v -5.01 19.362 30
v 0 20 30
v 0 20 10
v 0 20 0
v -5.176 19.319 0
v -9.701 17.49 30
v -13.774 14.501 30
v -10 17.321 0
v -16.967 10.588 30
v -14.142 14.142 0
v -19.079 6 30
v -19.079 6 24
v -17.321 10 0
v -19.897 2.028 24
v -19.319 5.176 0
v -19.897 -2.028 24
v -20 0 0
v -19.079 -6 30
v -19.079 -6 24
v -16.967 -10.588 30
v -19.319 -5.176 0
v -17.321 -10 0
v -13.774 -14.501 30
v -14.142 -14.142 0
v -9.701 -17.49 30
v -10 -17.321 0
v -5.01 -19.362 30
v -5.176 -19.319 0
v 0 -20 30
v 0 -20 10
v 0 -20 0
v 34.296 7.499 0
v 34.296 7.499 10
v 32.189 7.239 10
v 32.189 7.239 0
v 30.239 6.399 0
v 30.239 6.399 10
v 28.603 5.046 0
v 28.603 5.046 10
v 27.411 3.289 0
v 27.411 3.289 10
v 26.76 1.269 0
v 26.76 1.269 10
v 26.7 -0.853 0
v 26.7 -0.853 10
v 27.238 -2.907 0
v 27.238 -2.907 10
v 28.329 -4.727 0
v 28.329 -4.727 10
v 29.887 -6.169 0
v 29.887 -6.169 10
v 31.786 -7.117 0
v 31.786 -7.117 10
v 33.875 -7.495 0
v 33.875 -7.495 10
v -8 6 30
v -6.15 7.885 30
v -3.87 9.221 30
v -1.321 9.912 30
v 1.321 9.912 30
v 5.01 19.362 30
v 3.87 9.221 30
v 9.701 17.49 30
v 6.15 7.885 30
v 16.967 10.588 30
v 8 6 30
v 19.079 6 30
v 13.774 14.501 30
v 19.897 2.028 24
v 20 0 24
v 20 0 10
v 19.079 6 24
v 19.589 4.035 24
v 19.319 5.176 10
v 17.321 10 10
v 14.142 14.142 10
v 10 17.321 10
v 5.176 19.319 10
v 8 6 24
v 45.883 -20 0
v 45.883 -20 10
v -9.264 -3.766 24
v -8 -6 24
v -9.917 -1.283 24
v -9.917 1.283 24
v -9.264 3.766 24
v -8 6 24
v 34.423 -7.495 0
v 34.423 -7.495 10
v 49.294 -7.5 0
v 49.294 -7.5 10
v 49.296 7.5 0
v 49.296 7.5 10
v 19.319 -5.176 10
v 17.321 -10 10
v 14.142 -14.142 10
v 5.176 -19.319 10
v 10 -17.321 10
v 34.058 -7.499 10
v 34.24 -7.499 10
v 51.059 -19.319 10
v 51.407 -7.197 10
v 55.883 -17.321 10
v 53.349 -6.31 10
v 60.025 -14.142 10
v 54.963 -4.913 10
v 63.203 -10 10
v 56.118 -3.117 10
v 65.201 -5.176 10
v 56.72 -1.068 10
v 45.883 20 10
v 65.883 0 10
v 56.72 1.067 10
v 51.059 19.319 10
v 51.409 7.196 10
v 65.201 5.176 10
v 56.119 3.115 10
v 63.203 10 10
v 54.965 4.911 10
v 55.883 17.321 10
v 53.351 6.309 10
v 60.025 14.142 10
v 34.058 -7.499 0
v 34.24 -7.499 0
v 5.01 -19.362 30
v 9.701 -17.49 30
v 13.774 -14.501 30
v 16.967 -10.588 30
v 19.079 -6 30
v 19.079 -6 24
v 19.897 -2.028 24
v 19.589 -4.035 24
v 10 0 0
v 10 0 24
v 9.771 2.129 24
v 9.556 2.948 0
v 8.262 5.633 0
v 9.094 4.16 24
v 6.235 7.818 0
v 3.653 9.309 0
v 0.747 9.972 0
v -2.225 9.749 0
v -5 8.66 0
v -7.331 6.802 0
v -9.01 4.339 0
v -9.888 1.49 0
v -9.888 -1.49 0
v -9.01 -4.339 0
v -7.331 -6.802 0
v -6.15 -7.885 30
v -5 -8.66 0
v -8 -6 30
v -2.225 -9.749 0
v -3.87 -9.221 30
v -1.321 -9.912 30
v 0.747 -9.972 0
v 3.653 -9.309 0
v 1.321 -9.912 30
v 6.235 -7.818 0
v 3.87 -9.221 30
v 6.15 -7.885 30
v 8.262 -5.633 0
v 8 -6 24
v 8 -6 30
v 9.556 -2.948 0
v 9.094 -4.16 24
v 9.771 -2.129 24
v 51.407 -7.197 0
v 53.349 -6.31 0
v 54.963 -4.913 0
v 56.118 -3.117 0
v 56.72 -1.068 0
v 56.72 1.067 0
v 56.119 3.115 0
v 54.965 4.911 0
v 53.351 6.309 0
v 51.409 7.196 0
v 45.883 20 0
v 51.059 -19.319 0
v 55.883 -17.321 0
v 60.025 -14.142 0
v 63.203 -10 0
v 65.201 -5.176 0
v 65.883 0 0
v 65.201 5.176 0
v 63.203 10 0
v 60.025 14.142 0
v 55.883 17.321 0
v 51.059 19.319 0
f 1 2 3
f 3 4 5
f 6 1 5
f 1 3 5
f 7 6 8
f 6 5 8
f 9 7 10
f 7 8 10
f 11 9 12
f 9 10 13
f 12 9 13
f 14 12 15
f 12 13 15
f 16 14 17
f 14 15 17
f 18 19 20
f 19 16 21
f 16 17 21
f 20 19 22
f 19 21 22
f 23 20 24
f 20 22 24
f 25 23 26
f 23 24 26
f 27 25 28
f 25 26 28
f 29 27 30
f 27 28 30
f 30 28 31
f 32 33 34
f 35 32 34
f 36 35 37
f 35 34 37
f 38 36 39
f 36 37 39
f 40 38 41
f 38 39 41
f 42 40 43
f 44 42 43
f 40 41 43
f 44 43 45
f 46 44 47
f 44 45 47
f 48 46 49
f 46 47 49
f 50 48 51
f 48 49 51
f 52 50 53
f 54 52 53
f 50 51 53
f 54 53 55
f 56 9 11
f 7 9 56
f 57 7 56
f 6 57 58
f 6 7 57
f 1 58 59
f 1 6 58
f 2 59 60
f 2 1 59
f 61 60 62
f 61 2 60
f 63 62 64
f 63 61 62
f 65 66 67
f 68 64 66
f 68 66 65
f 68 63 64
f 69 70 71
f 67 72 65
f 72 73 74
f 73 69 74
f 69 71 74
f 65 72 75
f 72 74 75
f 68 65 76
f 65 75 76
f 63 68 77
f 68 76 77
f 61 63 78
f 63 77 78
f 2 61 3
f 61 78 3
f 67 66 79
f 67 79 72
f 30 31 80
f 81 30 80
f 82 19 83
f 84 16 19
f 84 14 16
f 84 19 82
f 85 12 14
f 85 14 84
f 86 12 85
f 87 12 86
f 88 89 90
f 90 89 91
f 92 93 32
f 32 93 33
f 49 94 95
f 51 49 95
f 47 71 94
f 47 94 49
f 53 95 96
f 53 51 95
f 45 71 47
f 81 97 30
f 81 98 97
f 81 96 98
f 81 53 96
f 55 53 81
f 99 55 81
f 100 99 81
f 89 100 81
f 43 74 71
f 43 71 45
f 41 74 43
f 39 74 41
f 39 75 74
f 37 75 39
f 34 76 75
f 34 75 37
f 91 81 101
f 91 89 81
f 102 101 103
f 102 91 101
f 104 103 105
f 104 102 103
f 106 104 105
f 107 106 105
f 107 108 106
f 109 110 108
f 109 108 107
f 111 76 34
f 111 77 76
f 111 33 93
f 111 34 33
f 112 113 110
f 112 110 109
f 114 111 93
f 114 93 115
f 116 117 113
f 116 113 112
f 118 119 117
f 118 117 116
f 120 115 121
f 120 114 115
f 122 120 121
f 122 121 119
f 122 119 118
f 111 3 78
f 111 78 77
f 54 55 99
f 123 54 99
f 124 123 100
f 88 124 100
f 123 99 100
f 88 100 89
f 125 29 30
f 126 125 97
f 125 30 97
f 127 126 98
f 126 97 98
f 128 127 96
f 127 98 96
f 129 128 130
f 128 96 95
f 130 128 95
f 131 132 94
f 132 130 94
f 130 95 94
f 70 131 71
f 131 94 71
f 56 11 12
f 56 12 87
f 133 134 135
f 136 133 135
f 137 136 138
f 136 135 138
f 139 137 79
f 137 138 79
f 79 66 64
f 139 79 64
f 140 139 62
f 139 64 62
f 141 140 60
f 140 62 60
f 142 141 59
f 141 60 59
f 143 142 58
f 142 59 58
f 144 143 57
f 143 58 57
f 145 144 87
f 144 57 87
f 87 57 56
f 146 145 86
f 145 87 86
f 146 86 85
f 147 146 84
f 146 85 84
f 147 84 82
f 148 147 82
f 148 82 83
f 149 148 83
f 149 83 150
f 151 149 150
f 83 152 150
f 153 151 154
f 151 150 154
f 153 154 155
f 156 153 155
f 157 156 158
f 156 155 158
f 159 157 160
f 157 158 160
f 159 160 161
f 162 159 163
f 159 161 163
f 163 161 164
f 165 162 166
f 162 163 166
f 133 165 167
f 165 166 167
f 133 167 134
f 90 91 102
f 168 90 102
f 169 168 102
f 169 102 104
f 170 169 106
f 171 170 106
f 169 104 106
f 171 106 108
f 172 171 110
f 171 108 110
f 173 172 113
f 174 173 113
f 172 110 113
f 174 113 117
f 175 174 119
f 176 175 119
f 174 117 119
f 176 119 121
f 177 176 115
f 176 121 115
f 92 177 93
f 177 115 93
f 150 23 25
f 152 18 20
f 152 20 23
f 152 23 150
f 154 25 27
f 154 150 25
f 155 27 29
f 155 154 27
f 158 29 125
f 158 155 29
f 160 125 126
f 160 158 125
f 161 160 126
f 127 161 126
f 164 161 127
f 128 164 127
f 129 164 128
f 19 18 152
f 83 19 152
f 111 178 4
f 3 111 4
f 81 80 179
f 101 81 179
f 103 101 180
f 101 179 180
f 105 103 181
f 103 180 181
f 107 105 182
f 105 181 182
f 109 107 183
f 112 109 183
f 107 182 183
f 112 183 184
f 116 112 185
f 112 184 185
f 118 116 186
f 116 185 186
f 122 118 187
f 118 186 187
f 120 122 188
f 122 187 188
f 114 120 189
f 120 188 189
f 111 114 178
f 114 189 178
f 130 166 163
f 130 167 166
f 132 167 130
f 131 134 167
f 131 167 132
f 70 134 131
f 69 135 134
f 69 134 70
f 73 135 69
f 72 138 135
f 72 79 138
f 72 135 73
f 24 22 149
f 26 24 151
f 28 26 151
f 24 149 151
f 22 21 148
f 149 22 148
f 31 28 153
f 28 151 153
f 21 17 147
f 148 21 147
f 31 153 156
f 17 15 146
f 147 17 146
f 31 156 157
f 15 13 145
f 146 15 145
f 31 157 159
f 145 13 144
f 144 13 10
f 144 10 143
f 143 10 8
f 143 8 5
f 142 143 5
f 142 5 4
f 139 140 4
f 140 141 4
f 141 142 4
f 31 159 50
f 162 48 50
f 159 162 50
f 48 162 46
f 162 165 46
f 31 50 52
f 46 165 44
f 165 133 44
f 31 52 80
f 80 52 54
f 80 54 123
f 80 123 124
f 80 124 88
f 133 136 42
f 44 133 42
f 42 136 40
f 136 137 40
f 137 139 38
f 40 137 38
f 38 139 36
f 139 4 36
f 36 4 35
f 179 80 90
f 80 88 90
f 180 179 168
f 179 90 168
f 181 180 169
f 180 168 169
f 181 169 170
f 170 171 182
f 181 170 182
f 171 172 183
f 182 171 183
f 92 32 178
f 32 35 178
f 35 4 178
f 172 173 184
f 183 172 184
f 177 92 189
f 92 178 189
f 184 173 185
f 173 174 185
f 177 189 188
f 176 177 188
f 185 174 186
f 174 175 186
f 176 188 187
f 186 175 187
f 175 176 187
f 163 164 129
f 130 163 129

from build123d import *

# Parameters (mm, degrees)
F1_DEPTH  = 10
F3_DEPTH  = 20
F4_R      = 10
F5_DEPTH  = 93.7
F6_W      = 50
F6_H      = 12
F7_DEPTH  = 6
F10_DEPTH = 28.9


with BuildPart() as f1:
    # F0 (on Top) → F1 (new body)
    with BuildSketch(Plane.XY):
        with BuildLine():
            Line((45.882642, 20), (0, 20))
            ThreePointArc((0, 20), (-20, 0), (0, -20))
            Line((0, -20), (45.882642, -20))
            ThreePointArc((45.882642, -20), (65.882642, 0), (45.882642, 20))
        make_face()
    extrude(amount=F1_DEPTH)

    # F2 (on face) → F3 (join)
    with BuildSketch(Plane.XY.offset(10)):
        with BuildLine():
            ThreePointArc((0, -20), (14.142136, -14.142136), (20, 0))
            ThreePointArc((20, 0), (14.142136, 14.142136), (0, 20))
            ThreePointArc((0, 20), (-20, 0), (0, -20))
        make_face()
    extrude(amount=F3_DEPTH)

    # F4 (on face) → F5 (cut)
    with BuildSketch(Plane.XY.offset(30)):
        Circle(F4_R)
    extrude(amount=-F5_DEPTH, mode=Mode.SUBTRACT)

    # F6 (on face) → F7 (cut)
    with BuildSketch(Plane.XY.offset(30)):
        Rectangle(F6_W, F6_H)
    extrude(amount=-F7_DEPTH, mode=Mode.SUBTRACT)

    # F8 (on face) + F9 (on face) → F10 (cut)
    with BuildSketch(Plane.XY.offset(10)):
        with BuildLine():
            Line((49.295593, 7.5), (34.295593, 7.498614))
            ThreePointArc((34.295593, 7.498614), (26.654353, 0.210243), (33.875122, -7.494909))
            Line((33.875122, -7.494909), (34.422741, -7.49509))
            Line((34.422741, -7.49509), (49.29381, -7.5))
            ThreePointArc((49.29381, -7.5), (56.796286, -0.000891), (49.295593, 7.5))
        make_face()
        with BuildLine():
            Line((34.422741, -7.49509), (33.875122, -7.494909))
            ThreePointArc((33.875122, -7.494909), (34.14893, -7.5), (34.422741, -7.49509))
        make_face()
    with BuildSketch(Plane.XY.offset(10)):
        with BuildLine():
            ThreePointArc((49.29381, -7.5), (56.796286, -0.000891), (49.295593, 7.5))
            Line((49.295593, 7.5), (34.295593, 7.498614))
            ThreePointArc((34.295593, 7.498614), (26.654353, 0.210243), (33.875122, -7.494909))
            Line((33.875122, -7.494909), (34.422741, -7.49509))
            Line((34.422741, -7.49509), (49.29381, -7.5))
        make_face()
    extrude(amount=-F10_DEPTH, mode=Mode.SUBTRACT)


solid = f1.part
